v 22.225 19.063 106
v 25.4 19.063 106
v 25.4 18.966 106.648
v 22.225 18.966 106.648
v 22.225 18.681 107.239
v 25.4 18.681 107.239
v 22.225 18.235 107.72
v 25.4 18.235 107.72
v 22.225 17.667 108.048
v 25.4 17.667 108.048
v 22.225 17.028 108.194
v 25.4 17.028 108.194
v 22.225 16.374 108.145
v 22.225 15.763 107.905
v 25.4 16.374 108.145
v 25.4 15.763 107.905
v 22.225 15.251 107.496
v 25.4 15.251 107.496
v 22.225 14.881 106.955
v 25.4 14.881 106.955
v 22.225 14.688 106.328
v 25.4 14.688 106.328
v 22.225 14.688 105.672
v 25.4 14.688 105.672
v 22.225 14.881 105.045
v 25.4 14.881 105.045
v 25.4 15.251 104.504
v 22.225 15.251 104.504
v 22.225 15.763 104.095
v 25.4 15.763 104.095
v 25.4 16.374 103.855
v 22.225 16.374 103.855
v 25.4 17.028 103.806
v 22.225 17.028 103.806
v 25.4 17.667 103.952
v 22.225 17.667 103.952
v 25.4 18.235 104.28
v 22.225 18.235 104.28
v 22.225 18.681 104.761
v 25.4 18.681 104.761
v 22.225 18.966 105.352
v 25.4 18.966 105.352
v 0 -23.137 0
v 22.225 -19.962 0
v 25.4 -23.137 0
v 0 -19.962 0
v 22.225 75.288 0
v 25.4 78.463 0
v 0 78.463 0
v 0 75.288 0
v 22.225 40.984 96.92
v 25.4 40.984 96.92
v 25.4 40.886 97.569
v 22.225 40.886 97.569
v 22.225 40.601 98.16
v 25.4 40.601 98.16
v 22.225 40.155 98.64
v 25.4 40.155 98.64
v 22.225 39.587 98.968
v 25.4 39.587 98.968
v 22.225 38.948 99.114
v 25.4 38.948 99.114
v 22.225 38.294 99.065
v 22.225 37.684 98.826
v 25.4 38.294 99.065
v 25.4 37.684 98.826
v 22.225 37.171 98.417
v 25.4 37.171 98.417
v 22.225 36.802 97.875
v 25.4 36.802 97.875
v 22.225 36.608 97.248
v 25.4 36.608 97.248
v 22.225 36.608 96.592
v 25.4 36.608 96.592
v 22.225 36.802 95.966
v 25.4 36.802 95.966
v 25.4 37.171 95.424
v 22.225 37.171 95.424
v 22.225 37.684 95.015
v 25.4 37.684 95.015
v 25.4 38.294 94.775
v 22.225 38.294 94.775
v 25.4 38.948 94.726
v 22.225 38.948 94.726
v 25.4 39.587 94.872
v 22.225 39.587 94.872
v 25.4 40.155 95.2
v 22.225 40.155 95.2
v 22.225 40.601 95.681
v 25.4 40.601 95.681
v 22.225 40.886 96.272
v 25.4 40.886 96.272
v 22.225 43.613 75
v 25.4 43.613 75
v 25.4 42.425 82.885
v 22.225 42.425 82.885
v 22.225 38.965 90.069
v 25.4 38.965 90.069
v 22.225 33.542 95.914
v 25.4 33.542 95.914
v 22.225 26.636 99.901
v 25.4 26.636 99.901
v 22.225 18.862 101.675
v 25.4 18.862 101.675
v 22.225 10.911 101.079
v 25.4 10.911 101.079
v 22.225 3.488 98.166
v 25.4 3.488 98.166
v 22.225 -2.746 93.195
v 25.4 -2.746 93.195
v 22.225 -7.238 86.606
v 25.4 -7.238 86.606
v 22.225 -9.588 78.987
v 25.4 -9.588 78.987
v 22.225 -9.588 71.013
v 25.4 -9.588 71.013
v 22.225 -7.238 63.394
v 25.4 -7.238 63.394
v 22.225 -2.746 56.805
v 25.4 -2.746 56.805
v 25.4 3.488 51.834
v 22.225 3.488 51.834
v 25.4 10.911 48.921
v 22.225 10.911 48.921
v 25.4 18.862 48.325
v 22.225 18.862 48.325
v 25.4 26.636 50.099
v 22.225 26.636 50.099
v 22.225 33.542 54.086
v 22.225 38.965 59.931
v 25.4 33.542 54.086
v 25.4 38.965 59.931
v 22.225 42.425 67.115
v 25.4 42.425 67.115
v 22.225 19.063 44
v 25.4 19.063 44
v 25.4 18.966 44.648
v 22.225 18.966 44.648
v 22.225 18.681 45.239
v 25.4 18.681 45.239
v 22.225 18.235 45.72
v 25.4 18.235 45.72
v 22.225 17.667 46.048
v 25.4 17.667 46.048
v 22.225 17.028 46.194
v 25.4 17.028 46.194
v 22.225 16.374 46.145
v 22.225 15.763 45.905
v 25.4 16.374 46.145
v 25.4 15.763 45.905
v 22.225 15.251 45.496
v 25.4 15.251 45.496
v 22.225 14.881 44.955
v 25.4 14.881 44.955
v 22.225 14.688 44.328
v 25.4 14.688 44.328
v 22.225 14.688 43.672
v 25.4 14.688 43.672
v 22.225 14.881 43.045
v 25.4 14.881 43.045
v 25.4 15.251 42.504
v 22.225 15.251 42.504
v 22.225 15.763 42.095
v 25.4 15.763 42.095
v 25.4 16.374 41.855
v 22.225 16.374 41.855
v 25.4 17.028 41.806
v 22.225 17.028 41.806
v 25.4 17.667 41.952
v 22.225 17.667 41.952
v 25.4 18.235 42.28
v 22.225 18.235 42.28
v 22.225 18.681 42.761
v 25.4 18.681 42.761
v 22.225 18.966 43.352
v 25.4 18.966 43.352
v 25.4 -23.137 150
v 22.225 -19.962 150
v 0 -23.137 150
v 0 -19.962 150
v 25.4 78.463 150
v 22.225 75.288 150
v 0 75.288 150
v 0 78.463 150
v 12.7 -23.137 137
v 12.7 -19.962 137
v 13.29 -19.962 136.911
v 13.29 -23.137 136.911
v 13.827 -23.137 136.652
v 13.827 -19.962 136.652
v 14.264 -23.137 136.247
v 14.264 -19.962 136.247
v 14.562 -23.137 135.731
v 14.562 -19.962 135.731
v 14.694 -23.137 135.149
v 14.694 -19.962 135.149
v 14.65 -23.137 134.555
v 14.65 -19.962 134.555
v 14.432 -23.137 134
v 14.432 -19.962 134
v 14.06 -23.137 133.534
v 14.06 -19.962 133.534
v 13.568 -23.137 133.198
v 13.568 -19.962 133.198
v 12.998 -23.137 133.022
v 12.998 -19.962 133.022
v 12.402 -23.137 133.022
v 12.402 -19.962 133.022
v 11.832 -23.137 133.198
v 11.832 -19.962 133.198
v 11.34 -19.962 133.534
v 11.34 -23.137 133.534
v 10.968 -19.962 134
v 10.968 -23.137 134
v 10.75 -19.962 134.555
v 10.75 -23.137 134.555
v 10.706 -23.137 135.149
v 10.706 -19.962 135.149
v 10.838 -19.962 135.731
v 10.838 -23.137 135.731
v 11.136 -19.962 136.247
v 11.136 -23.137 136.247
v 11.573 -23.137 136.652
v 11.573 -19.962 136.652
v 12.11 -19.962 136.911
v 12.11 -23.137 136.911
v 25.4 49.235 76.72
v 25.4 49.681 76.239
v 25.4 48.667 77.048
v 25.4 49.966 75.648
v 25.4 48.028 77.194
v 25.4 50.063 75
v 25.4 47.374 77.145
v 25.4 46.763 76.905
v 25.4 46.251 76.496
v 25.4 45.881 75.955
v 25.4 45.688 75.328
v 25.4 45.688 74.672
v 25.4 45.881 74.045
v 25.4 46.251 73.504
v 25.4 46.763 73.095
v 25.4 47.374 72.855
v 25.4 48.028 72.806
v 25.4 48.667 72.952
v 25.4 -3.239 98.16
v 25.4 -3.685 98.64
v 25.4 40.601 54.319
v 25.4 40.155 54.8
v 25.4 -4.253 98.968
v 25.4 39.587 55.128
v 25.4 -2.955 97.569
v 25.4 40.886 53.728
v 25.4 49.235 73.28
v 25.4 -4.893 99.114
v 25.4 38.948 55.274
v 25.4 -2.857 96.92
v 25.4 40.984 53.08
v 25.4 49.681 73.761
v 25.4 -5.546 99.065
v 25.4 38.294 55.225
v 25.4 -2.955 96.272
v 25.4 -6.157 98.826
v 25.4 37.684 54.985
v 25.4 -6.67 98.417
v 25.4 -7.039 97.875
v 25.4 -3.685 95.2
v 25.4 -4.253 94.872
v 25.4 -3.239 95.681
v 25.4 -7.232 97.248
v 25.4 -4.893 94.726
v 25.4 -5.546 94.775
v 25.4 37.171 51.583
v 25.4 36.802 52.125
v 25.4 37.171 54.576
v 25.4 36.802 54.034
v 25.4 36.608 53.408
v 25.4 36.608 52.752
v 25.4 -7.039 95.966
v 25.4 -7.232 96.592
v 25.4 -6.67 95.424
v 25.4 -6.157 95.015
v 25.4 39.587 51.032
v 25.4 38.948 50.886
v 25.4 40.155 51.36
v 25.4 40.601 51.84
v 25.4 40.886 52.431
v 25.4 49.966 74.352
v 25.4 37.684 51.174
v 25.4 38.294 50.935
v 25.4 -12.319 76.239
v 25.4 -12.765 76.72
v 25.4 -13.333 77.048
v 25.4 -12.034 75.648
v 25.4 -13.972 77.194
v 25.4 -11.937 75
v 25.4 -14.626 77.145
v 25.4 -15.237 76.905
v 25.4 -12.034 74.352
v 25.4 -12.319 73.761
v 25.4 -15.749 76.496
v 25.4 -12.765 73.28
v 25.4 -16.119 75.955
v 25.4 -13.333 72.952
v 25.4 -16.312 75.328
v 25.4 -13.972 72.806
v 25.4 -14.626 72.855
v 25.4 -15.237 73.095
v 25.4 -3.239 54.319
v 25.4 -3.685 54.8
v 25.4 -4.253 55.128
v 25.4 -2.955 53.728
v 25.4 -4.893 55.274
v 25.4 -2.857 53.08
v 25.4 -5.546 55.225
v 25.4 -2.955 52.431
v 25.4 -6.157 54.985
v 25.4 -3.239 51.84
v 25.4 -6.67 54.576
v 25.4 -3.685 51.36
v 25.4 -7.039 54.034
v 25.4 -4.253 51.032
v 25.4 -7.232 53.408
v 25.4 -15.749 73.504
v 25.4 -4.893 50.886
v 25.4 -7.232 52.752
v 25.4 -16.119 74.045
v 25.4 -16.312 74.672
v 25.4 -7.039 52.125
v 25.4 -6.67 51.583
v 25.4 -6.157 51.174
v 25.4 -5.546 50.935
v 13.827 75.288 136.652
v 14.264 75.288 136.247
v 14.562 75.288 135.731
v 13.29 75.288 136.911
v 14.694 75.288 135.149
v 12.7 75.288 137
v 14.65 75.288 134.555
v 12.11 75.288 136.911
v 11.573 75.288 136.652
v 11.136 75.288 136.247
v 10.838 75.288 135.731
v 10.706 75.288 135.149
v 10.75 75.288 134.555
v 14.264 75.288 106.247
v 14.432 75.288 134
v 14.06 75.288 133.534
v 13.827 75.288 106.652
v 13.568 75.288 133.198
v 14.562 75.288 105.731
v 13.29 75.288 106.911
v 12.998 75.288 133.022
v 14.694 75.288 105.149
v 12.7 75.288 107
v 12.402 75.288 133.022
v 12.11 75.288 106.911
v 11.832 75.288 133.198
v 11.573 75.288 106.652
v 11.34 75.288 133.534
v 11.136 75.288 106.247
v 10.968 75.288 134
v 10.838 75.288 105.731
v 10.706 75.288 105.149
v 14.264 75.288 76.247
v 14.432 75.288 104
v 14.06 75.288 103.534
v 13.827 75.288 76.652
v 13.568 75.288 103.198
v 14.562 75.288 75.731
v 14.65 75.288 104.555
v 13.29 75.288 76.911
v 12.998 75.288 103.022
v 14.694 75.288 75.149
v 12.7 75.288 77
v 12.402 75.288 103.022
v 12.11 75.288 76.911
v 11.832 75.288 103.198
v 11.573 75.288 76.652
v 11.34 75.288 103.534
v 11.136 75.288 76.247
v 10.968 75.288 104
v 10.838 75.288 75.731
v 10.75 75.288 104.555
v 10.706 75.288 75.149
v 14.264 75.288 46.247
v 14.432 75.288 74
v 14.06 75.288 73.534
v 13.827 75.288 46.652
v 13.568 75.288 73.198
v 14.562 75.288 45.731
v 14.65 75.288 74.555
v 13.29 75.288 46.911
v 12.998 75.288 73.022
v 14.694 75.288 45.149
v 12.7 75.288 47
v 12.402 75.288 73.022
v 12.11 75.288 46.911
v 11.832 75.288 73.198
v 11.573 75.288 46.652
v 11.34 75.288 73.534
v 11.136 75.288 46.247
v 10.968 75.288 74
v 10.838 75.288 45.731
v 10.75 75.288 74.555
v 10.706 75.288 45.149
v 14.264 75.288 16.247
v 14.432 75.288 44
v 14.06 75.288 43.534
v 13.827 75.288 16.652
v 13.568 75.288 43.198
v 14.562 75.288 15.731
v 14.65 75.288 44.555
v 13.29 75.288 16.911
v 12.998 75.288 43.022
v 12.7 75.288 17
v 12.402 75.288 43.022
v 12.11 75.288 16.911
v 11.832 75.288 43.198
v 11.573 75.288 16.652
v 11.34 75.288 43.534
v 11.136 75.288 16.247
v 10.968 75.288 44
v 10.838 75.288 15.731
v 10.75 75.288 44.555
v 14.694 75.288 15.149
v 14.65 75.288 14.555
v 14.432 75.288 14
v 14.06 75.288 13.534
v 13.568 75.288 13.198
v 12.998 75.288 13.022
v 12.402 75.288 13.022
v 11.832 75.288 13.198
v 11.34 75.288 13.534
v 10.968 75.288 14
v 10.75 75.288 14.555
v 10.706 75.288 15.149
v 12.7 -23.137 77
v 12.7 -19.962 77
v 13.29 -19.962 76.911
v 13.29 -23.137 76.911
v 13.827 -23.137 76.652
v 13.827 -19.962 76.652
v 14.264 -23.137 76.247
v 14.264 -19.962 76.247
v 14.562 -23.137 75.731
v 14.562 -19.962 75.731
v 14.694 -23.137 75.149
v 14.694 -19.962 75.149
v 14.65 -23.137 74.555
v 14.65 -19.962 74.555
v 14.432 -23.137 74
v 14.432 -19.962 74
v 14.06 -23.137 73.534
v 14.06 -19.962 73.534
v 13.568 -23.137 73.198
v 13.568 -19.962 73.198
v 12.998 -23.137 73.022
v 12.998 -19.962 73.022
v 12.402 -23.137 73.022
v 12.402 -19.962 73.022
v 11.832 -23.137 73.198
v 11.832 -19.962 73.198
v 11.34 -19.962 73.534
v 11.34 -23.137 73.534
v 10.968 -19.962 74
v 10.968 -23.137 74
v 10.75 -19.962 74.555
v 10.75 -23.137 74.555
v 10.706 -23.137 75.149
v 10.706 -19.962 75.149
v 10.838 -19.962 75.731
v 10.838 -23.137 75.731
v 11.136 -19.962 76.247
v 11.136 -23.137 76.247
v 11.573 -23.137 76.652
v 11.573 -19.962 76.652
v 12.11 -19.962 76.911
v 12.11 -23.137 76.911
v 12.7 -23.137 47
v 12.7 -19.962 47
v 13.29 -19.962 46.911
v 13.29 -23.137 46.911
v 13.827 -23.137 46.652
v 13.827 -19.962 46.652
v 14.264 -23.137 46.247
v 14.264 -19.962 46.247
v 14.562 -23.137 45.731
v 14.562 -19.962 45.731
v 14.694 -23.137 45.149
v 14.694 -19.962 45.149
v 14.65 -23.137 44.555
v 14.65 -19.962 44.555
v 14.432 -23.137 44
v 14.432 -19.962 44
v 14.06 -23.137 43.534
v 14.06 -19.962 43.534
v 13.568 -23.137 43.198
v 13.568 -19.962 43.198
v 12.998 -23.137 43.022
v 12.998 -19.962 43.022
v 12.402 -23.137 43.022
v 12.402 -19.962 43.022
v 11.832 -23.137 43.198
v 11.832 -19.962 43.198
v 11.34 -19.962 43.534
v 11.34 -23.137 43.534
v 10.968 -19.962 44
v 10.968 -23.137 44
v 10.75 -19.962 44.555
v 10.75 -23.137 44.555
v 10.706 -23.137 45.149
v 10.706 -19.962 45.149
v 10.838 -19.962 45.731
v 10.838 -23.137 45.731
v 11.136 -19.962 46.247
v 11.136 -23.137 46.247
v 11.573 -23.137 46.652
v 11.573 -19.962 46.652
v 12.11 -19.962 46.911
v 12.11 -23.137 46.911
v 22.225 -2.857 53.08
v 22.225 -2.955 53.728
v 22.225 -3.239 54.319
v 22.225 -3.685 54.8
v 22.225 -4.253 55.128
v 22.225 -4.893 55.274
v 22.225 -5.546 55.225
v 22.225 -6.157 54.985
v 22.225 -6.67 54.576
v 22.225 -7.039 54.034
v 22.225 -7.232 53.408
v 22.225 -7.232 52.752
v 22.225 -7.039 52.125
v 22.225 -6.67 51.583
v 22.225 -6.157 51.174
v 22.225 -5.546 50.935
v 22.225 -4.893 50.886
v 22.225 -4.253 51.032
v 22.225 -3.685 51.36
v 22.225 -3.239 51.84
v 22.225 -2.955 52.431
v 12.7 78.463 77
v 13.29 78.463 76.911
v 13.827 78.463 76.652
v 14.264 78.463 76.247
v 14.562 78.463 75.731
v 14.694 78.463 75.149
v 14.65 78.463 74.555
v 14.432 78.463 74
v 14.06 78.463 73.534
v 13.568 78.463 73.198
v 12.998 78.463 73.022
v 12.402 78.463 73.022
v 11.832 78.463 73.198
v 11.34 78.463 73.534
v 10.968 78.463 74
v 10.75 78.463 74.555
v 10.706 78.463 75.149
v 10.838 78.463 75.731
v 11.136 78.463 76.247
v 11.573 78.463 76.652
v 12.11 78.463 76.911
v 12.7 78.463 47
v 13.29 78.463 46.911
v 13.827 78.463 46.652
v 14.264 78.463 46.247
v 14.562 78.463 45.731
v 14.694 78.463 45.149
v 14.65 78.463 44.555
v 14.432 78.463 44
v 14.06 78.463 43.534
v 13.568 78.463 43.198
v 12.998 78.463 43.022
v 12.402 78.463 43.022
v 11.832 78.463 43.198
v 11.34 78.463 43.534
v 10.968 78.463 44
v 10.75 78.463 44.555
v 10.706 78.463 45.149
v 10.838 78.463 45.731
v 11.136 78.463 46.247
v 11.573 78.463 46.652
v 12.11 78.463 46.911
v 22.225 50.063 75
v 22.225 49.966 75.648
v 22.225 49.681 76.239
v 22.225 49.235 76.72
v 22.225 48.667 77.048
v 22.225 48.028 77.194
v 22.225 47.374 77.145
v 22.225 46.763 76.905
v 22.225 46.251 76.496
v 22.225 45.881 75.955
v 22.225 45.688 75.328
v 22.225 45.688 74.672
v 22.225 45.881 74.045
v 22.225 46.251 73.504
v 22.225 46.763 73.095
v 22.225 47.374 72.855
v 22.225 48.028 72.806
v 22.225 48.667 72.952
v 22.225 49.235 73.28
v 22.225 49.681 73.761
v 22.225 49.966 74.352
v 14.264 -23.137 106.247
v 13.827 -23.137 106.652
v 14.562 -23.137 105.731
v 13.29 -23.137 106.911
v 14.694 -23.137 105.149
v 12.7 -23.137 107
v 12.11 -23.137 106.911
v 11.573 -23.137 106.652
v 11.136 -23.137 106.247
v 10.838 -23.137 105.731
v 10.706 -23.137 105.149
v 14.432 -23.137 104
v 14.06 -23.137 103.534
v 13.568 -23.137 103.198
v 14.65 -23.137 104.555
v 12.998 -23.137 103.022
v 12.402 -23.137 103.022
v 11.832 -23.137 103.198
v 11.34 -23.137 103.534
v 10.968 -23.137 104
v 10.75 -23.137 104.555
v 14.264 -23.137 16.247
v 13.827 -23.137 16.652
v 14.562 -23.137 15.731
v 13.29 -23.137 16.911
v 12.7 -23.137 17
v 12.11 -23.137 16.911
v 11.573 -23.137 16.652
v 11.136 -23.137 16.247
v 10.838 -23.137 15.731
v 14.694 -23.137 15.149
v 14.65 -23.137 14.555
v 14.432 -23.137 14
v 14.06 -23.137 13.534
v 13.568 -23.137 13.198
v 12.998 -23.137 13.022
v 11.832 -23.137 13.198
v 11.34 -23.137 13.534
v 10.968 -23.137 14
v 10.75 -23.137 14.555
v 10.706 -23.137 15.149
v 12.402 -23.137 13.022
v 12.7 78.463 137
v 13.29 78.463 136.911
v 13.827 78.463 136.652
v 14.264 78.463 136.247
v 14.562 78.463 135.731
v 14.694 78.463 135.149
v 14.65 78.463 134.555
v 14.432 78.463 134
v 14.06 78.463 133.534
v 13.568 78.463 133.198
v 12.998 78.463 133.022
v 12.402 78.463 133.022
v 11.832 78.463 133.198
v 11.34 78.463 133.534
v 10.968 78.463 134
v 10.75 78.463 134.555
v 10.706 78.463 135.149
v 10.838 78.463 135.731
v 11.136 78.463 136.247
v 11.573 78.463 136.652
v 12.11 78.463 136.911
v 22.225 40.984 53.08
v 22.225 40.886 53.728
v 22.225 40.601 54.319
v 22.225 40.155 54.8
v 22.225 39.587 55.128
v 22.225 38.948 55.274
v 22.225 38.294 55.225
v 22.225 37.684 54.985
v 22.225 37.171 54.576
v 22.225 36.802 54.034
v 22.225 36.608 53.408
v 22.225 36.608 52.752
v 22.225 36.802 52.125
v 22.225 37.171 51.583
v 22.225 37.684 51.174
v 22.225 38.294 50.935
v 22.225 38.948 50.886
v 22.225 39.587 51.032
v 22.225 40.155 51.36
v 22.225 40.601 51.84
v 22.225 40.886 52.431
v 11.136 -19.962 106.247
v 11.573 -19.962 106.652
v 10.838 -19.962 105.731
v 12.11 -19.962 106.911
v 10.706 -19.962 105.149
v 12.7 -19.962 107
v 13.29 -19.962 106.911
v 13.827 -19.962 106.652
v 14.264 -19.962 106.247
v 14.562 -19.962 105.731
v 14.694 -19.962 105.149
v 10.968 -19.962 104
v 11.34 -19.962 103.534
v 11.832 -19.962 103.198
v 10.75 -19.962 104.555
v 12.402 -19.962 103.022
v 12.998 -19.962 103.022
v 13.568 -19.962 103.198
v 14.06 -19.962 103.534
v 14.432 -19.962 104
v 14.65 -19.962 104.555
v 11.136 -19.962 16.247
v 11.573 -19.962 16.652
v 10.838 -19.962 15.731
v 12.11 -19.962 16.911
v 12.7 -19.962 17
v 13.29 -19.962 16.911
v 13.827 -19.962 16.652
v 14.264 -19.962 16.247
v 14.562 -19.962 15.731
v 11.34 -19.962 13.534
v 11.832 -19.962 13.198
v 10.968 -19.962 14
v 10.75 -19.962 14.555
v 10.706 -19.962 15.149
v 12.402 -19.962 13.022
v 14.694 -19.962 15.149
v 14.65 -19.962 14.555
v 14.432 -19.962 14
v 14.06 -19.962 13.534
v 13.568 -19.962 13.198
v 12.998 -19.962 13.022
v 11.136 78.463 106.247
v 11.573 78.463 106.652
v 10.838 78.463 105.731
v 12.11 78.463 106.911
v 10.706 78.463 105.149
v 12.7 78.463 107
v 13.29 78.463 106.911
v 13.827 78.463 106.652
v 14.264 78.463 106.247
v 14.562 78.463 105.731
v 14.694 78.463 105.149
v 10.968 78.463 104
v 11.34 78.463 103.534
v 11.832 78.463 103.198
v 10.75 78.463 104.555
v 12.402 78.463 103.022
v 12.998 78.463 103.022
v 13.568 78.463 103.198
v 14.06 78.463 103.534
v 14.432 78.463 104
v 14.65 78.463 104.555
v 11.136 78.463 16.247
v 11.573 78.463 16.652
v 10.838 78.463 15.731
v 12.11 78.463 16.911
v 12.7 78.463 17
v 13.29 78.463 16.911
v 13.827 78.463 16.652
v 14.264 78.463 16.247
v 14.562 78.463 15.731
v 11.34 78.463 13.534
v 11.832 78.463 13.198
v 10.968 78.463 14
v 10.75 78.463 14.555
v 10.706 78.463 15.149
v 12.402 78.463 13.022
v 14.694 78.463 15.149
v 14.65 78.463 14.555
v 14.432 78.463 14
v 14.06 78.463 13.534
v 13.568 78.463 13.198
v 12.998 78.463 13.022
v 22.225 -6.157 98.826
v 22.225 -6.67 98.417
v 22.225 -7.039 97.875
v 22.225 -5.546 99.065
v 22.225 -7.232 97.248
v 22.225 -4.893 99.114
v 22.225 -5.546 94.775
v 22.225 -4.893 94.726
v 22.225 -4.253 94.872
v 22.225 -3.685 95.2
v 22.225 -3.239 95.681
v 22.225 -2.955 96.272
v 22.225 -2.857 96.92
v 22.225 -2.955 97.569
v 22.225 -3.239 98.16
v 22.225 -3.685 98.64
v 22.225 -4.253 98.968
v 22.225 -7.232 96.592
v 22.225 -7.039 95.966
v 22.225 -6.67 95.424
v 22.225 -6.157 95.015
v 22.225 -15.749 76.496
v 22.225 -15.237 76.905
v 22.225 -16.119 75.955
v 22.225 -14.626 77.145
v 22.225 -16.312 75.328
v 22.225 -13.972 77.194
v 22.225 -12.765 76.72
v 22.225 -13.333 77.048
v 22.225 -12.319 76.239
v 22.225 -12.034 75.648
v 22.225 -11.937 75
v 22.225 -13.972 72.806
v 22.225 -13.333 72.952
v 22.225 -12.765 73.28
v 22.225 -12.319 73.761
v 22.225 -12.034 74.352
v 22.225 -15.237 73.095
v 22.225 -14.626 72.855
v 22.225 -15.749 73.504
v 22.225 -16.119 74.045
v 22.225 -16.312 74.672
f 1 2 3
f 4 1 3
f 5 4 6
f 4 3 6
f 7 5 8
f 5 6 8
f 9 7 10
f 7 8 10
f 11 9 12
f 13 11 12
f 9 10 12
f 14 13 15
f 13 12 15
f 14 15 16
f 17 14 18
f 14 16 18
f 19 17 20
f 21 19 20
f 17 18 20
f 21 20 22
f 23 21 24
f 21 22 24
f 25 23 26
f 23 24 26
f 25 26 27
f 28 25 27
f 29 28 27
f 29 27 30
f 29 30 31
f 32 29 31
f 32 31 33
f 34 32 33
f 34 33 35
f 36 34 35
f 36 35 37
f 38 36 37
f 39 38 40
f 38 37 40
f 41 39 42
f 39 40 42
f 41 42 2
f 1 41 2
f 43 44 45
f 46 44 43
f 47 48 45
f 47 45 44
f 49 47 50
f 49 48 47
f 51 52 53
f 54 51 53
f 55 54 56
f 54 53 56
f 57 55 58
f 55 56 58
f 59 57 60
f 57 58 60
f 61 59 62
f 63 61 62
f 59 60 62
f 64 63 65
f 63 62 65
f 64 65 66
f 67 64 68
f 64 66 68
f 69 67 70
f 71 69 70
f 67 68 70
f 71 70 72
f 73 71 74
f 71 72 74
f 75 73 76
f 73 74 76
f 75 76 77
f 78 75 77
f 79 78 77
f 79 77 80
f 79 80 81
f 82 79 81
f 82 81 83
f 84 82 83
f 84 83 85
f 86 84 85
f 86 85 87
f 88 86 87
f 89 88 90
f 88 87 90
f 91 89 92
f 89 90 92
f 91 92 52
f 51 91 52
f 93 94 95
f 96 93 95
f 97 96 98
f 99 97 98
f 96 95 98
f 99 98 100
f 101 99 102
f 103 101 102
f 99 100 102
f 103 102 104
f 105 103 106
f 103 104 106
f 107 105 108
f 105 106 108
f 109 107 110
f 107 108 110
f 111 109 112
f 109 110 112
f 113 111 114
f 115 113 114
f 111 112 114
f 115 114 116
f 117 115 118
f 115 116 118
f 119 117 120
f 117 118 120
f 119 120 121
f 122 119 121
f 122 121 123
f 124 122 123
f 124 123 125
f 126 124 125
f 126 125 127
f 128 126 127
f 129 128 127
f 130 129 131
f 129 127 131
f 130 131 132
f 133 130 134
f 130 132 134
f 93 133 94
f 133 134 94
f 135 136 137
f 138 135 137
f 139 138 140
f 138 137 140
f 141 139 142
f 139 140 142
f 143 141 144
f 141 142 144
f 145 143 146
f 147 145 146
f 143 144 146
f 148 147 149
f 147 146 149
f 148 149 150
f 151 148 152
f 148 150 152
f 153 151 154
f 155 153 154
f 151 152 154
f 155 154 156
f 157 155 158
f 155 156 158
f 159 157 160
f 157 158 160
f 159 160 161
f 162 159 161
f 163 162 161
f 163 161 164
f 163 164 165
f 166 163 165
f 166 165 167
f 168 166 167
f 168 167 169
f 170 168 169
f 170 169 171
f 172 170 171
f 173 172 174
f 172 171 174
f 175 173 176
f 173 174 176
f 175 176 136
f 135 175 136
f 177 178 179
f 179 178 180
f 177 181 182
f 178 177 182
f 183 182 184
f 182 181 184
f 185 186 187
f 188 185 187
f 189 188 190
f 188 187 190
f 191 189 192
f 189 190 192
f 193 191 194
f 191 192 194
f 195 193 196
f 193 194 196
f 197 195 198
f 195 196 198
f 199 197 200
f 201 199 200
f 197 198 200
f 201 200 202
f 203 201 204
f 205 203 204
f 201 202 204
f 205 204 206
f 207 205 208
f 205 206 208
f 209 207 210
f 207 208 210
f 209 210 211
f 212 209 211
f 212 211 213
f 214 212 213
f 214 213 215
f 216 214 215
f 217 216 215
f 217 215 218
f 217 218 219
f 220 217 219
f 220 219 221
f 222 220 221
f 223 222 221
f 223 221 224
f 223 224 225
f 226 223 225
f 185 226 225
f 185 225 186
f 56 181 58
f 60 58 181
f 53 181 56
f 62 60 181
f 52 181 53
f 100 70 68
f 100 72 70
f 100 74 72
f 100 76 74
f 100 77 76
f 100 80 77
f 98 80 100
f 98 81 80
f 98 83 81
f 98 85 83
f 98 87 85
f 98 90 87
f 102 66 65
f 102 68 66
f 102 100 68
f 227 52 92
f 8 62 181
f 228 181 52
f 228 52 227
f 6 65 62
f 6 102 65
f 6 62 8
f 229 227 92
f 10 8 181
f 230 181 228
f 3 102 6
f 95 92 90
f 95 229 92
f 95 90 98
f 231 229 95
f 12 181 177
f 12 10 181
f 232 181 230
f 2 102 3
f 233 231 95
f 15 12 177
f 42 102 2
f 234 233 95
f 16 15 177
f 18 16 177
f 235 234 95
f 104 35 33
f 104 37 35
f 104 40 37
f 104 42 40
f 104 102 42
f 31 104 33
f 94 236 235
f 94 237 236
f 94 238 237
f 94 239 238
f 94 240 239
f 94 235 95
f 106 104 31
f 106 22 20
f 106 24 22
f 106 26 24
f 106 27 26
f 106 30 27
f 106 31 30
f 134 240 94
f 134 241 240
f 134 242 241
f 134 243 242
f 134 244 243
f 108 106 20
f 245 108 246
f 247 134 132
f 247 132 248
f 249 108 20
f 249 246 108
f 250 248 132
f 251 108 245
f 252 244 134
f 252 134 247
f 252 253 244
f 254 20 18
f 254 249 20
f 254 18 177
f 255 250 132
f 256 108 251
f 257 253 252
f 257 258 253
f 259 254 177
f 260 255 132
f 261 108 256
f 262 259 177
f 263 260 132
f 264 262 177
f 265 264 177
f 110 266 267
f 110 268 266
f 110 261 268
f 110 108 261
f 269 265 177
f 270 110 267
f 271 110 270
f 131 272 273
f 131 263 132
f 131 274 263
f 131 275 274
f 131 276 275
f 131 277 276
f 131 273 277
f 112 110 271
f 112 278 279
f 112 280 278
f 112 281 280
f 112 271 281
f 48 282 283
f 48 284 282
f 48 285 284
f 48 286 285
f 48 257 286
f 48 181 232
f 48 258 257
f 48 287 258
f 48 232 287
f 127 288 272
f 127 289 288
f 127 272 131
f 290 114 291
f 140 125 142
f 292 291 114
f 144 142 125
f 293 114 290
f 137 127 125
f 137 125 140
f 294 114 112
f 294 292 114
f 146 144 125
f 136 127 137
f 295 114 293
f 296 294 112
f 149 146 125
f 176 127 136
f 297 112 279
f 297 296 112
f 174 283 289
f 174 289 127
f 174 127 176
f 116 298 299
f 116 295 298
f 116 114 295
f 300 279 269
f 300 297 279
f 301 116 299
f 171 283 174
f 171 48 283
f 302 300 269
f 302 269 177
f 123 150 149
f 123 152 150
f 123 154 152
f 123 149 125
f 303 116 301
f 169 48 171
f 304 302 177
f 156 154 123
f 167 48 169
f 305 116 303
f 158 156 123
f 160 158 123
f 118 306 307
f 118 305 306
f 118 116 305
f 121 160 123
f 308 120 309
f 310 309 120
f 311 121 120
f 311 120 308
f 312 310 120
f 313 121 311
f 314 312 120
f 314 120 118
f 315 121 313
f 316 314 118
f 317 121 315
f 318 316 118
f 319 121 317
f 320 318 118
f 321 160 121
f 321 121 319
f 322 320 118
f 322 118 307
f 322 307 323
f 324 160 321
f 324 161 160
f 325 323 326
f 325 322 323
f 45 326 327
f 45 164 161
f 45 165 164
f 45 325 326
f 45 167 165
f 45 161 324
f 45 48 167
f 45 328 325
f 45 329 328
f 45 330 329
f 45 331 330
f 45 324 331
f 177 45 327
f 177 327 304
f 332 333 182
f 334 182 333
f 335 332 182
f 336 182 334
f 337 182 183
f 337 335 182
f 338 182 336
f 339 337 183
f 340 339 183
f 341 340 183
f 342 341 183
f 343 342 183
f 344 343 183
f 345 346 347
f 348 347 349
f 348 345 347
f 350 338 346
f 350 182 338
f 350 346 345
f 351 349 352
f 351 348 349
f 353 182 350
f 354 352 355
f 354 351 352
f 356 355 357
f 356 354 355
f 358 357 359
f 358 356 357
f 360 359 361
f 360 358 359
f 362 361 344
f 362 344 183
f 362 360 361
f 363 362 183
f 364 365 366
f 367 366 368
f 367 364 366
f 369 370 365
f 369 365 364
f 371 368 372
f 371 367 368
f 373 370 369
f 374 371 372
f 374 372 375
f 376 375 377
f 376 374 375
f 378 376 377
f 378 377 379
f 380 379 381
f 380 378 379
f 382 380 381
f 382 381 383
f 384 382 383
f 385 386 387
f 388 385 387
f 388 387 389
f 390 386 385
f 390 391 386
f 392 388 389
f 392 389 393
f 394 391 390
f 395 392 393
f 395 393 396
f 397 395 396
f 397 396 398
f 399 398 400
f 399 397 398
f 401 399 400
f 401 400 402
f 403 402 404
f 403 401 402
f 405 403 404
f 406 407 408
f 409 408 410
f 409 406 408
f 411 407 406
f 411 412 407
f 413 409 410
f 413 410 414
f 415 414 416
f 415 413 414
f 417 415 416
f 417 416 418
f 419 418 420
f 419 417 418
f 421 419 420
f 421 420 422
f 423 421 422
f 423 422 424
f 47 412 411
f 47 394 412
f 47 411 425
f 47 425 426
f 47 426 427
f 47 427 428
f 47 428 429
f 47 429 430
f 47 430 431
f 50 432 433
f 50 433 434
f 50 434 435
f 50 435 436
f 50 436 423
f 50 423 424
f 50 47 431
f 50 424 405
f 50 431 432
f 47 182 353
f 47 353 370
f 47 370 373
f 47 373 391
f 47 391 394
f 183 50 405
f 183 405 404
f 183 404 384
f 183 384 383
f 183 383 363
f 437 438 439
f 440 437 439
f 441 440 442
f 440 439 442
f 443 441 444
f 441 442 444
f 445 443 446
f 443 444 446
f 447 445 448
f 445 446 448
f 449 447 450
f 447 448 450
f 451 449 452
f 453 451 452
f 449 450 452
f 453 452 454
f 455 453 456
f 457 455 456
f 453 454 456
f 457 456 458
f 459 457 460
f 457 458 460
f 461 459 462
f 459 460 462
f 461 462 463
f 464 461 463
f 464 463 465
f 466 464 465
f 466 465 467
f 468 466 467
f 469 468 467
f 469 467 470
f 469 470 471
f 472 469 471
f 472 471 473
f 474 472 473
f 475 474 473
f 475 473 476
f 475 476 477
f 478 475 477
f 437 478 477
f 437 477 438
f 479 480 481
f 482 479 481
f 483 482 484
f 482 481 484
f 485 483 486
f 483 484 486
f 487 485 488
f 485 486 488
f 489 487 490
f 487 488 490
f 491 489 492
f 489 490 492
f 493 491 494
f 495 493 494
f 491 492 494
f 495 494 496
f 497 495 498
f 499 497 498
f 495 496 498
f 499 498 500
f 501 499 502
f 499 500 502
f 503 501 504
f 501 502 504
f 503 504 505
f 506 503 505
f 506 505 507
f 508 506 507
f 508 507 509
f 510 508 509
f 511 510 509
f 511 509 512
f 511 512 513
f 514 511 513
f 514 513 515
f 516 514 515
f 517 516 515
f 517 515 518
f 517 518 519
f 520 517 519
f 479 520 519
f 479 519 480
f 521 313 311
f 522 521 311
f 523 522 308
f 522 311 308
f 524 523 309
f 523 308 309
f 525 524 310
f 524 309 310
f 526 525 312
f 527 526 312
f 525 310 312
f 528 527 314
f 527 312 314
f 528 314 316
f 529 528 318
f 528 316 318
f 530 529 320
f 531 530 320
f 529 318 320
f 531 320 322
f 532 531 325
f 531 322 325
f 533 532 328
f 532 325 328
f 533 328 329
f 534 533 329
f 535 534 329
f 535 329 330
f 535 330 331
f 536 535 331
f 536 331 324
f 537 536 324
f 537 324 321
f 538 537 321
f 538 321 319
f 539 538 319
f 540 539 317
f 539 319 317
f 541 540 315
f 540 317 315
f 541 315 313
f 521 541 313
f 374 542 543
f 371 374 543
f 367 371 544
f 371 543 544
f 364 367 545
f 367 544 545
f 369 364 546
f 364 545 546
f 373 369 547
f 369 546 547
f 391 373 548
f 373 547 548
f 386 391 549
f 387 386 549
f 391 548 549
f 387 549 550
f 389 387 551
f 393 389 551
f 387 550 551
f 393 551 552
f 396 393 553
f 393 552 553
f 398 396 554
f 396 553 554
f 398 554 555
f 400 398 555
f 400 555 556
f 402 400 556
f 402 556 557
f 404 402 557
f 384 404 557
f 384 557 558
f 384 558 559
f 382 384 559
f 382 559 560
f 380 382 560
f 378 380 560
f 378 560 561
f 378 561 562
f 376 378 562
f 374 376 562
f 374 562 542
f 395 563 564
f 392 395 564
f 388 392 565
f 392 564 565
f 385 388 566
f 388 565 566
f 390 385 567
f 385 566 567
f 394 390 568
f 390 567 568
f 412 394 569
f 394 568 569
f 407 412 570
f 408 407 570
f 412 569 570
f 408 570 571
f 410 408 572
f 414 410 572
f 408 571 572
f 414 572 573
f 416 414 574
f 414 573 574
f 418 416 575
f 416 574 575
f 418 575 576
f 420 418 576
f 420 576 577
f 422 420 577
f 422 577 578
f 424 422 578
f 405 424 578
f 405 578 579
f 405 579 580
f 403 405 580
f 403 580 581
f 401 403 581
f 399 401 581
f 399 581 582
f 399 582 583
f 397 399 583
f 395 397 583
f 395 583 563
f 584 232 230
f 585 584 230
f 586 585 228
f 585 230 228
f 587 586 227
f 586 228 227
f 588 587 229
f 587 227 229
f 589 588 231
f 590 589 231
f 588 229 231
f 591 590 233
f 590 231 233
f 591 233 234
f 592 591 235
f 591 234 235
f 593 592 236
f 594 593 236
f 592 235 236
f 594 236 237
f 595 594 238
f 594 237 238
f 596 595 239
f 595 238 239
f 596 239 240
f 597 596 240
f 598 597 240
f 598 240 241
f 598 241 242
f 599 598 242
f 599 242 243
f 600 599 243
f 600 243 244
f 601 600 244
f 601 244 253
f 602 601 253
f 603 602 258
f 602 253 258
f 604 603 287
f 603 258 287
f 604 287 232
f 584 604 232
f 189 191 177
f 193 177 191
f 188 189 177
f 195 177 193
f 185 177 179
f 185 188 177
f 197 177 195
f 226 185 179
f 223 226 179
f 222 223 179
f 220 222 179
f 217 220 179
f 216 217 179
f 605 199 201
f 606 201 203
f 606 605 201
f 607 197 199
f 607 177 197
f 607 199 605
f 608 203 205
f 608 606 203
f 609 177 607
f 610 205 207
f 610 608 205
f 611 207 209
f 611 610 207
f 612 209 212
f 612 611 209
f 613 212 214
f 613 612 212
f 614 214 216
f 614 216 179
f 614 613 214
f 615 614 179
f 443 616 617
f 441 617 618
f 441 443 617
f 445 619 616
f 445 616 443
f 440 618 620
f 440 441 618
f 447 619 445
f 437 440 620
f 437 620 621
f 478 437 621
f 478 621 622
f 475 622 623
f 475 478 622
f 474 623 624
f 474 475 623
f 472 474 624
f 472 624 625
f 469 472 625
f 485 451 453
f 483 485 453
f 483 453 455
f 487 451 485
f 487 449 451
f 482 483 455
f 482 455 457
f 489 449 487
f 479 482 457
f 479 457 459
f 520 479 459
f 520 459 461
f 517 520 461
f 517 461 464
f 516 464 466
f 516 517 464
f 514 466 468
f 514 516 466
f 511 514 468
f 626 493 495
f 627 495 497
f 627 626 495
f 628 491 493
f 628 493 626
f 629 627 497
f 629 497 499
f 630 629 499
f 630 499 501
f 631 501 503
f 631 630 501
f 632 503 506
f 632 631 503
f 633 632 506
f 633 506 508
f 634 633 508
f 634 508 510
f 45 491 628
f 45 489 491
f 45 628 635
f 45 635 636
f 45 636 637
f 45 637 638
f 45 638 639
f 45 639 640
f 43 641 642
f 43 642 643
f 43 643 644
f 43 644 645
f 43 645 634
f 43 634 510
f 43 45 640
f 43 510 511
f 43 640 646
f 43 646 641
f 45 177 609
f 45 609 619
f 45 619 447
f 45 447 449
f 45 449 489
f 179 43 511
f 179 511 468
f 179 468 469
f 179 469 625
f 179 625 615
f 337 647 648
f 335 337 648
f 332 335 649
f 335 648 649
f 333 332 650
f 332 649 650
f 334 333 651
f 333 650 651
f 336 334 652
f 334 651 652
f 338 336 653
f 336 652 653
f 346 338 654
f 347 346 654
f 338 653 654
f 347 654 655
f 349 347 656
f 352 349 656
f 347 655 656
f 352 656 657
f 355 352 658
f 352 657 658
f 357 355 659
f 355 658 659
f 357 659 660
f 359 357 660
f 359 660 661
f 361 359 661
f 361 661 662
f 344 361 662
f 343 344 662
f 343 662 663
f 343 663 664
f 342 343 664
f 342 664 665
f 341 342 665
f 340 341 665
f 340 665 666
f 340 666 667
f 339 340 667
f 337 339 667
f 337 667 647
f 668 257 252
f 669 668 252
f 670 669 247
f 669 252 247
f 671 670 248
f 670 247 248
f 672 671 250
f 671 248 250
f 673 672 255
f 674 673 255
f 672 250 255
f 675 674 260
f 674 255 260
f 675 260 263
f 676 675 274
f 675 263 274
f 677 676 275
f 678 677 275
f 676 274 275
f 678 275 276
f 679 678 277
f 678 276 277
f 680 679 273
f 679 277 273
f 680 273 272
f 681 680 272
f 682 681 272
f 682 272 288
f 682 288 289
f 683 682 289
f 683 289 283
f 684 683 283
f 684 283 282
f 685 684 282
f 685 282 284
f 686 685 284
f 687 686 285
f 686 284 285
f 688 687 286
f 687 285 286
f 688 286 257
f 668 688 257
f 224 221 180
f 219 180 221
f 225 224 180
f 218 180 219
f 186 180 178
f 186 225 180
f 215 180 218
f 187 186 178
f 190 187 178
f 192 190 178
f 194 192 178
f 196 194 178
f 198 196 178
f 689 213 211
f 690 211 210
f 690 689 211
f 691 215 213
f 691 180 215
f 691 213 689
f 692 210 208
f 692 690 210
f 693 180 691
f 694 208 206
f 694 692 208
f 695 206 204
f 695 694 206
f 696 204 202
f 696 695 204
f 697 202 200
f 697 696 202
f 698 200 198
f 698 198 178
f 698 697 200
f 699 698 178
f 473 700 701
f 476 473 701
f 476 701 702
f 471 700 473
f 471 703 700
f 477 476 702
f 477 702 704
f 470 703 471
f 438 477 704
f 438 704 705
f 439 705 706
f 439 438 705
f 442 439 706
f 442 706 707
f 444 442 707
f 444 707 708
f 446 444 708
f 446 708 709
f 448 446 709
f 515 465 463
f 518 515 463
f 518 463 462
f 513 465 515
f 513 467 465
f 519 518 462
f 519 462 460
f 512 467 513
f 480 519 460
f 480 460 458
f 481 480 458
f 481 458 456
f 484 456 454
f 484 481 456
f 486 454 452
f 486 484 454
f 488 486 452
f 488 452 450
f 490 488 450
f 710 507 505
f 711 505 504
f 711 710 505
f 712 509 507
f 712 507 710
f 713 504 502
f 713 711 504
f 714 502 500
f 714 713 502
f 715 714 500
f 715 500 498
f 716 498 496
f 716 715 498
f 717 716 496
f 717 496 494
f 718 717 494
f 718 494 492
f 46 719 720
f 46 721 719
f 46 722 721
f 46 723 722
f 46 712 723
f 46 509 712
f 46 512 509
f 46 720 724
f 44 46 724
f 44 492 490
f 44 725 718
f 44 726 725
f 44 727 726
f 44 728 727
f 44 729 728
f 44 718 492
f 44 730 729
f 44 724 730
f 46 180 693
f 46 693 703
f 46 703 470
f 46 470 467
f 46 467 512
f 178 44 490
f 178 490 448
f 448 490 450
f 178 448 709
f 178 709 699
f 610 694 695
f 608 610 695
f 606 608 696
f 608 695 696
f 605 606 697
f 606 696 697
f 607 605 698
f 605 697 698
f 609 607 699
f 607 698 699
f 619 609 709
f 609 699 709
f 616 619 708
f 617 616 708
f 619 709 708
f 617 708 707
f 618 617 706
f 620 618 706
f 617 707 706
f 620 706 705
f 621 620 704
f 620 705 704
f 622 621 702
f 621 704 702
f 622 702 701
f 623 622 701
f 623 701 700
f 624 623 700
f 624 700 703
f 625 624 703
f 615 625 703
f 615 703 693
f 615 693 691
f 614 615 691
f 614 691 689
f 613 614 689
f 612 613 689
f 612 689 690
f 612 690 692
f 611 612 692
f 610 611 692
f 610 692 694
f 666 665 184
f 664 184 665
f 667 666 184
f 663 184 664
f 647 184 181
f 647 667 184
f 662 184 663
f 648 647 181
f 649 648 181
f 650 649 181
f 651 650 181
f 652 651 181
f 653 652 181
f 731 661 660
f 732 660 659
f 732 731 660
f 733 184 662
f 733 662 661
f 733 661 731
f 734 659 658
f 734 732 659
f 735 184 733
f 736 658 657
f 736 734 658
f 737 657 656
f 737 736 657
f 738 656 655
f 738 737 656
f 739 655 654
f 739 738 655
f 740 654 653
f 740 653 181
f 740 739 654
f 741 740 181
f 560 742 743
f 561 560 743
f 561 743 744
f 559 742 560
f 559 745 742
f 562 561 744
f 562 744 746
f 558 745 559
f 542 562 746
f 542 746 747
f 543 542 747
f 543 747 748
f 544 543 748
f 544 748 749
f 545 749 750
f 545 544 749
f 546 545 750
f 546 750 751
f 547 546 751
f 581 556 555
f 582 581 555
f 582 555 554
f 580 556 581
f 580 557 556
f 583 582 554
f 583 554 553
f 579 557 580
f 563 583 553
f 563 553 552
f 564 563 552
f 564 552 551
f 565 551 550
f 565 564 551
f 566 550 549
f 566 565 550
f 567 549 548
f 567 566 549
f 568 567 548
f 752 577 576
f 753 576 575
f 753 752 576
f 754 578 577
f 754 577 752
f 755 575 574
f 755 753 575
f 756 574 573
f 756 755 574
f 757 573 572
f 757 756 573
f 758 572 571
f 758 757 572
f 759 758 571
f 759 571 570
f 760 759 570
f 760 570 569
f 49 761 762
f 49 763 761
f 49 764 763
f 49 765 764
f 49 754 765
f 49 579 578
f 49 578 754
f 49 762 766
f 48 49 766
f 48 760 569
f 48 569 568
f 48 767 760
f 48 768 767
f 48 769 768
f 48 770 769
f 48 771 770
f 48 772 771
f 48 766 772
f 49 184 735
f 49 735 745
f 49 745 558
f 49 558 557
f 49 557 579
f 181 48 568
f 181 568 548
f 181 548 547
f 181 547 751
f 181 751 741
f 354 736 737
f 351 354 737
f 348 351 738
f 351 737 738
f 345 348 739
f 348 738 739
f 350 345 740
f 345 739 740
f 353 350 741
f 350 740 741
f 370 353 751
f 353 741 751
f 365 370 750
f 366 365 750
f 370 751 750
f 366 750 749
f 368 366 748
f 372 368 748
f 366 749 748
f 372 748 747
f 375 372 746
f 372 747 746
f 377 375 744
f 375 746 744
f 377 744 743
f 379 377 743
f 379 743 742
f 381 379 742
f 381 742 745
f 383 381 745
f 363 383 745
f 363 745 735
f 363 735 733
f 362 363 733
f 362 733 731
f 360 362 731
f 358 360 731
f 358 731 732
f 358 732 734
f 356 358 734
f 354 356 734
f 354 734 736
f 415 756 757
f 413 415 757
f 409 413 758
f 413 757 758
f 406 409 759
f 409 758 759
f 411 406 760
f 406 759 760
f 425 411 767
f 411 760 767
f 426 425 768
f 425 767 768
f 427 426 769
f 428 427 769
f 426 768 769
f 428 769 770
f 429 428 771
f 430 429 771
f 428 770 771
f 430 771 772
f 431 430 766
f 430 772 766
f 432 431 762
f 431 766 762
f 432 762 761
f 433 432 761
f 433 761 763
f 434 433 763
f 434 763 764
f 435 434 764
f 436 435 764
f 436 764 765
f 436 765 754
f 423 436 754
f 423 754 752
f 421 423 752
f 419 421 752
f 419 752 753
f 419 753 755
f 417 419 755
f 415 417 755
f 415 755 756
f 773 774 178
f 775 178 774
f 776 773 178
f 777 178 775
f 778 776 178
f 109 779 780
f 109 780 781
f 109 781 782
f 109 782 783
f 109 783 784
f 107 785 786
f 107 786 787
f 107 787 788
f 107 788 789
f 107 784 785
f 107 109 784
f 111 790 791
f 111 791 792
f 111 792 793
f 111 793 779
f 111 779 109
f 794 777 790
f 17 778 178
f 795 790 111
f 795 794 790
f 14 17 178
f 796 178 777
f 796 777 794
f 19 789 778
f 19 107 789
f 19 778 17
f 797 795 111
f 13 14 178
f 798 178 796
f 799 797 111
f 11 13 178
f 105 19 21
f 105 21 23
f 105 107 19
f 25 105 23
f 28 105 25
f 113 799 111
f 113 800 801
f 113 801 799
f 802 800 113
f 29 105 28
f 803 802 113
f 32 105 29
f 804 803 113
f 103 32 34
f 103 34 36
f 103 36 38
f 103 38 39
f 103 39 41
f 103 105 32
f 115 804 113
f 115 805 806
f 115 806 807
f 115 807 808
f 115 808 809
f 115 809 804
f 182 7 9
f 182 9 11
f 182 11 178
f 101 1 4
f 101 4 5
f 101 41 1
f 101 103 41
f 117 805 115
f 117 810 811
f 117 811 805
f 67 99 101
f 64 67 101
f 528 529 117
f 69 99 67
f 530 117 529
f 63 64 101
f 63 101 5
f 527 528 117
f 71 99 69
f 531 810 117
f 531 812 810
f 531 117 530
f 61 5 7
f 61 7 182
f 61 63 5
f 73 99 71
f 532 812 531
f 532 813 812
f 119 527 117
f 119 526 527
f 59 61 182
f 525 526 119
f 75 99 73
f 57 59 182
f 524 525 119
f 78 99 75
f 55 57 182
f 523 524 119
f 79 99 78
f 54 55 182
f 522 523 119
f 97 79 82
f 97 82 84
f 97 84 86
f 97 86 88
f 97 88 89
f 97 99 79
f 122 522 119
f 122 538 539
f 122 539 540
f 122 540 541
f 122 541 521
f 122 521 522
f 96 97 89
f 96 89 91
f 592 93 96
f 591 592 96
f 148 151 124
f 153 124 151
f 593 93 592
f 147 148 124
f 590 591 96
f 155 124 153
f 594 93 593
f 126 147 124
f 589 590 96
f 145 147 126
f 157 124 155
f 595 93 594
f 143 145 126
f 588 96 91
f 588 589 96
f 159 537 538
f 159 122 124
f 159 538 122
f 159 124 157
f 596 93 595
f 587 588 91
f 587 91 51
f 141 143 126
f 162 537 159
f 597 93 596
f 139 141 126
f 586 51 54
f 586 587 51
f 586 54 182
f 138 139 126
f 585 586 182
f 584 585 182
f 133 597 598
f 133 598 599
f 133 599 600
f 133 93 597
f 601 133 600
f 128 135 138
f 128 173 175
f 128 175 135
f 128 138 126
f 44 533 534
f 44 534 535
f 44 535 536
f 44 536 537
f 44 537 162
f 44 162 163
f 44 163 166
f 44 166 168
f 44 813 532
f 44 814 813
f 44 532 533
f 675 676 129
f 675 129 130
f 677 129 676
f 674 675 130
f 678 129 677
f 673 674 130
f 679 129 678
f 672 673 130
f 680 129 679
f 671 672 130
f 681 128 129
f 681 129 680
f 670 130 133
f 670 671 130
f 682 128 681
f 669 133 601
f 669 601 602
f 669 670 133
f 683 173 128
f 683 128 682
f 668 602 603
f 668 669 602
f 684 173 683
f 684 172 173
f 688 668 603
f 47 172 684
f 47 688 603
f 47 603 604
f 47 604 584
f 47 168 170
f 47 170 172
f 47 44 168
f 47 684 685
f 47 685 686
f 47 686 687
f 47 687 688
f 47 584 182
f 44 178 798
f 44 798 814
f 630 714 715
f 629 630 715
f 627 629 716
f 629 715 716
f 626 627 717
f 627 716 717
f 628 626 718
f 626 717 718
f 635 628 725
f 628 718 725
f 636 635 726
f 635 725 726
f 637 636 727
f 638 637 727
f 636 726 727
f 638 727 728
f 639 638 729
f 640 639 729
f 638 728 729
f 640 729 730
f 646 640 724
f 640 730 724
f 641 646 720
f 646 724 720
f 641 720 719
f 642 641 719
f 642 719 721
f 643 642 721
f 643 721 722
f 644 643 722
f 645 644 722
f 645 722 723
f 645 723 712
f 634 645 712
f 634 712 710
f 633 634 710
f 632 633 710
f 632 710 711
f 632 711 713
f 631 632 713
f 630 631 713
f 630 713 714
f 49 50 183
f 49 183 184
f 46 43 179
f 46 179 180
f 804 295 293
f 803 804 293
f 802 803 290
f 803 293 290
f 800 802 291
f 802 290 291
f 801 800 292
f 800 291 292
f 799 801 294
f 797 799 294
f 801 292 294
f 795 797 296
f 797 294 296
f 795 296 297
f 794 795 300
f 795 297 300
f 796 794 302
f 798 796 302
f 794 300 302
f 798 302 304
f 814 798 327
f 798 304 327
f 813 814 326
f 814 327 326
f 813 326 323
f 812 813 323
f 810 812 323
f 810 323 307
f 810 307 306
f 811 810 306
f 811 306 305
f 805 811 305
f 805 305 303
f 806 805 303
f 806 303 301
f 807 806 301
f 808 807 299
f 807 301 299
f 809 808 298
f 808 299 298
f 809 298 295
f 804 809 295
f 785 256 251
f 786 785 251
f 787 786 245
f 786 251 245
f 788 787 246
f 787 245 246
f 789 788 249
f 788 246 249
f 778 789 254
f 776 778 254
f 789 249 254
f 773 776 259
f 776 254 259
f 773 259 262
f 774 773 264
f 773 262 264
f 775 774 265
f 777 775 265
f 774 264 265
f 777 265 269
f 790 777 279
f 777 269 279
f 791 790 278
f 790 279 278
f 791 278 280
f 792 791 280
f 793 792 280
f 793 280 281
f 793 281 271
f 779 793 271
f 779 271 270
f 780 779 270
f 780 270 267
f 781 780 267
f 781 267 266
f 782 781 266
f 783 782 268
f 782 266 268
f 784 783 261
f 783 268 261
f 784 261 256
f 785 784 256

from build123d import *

# Parameters (mm, degrees)
BOSS_EXTRUDE1_DEPTH = 150
SKETCH2_R           = 26.75
SKETCH2_R_2         = 2.2
CUT_EXTRUDE1_DEPTH  = 3.175
CUT_EXTRUDE2_REACH  = 184.942
SKETCH3_R           = 2


with BuildPart() as part:
    # Sketch1 → Boss-Extrude1 (new body)
    with BuildSketch(Plane.XY):
        Polygon((0, 78.463366337), (25.4, 78.463366337), (25.4, -23.136633663), (0, -23.136633663), (0, -19.961633663), (22.225, -19.961633663), (22.225, 75.288366337), (0, 75.288366337), align=None)
    extrude(amount=BOSS_EXTRUDE1_DEPTH)

    # Sketch2 → Cut-Extrude1 (cut)
    with BuildSketch(Plane(origin=(25.4, 0, 0), x_dir=(0, 0, -1), z_dir=(1, 0, 0))):
        with Locations(Location((-75, 16.863366337, 0), (0, 0, 90))):
            Circle(SKETCH2_R)
        with Locations(Location((-75, 47.863366337, 0), (0, 0, 90))):
            Circle(SKETCH2_R_2)
        with Locations(Location((-53.079689783, 38.783676553, 0), (0, 0, 90))):
            Circle(SKETCH2_R_2)
        with Locations(Location((-44, 16.863366337, 0), (0, 0, 90))):
            Circle(SKETCH2_R_2)
        with Locations(Location((-53.079689783, -5.05694388, 0), (0, 0, 90))):
            Circle(SKETCH2_R_2)
        with Locations(Location((-75, -14.136633663, 0), (0, 0, 90))):
            Circle(SKETCH2_R_2)
        with Locations(Location((-96.920310217, -5.05694388, 0), (0, 0, 90))):
            Circle(SKETCH2_R_2)
        with Locations(Location((-106, 16.863366337, 0), (0, 0, 90))):
            Circle(SKETCH2_R_2)
        with Locations(Location((-96.920310217, 38.783676553, 0), (0, 0, 90))):
            Circle(SKETCH2_R_2)
    extrude(amount=-CUT_EXTRUDE1_DEPTH, mode=Mode.SUBTRACT)

    # Cut-Extrude2: up to this face of the body (flat: up to its plane)
    cut_extrude2_end = Plane(part.part.faces().sort_by_distance((12.7, -23.136633663, 75))[0])
    # Sketch3 → Cut-Extrude2 (cut, up to the picked face)
    with BuildSketch(Plane(origin=(0, 78.463366337, 0), x_dir=(1, 0, 0), z_dir=(0, 1, 0)), mode=Mode.PRIVATE) as cut_extrude2_sk1:
        with Locations(Location((12.7, -75, 0), (0, 0, 270))):
            Circle(SKETCH3_R)
    cut_extrude2_tool1 = split(extrude(cut_extrude2_sk1.sketch, amount=-CUT_EXTRUDE2_REACH, mode=Mode.PRIVATE), bisect_by=cut_extrude2_end, keep=Keep.BOTH, mode=Mode.PRIVATE)
    # Sketch3 → Cut-Extrude2 (cut, up to the picked face)
    with BuildSketch(Plane(origin=(0, 78.463366337, 0), x_dir=(1, 0, 0), z_dir=(0, 1, 0)), mode=Mode.PRIVATE) as cut_extrude2_sk2:
        with Locations(Location((12.7, -105, 0), (0, 0, 270))):
            Circle(SKETCH3_R)
    cut_extrude2_tool2 = split(extrude(cut_extrude2_sk2.sketch, amount=-CUT_EXTRUDE2_REACH, mode=Mode.PRIVATE), bisect_by=cut_extrude2_end, keep=Keep.BOTH, mode=Mode.PRIVATE)
    # Sketch3 → Cut-Extrude2 (cut, up to the picked face)
    with BuildSketch(Plane(origin=(0, 78.463366337, 0), x_dir=(1, 0, 0), z_dir=(0, 1, 0)), mode=Mode.PRIVATE) as cut_extrude2_sk3:
        with Locations(Location((12.7, -135, 0), (0, 0, 270))):
            Circle(SKETCH3_R)
    cut_extrude2_tool3 = split(extrude(cut_extrude2_sk3.sketch, amount=-CUT_EXTRUDE2_REACH, mode=Mode.PRIVATE), bisect_by=cut_extrude2_end, keep=Keep.BOTH, mode=Mode.PRIVATE)
    # Sketch3 → Cut-Extrude2 (cut, up to the picked face)
    with BuildSketch(Plane(origin=(0, 78.463366337, 0), x_dir=(1, 0, 0), z_dir=(0, 1, 0)), mode=Mode.PRIVATE) as cut_extrude2_sk4:
        with Locations(Location((12.7, -45, 0), (0, 0, 270))):
            Circle(SKETCH3_R)
    cut_extrude2_tool4 = split(extrude(cut_extrude2_sk4.sketch, amount=-CUT_EXTRUDE2_REACH, mode=Mode.PRIVATE), bisect_by=cut_extrude2_end, keep=Keep.BOTH, mode=Mode.PRIVATE)
    # Sketch3 → Cut-Extrude2 (cut, up to the picked face)
    with BuildSketch(Plane(origin=(0, 78.463366337, 0), x_dir=(1, 0, 0), z_dir=(0, 1, 0)), mode=Mode.PRIVATE) as cut_extrude2_sk5:
        with Locations(Location((12.7, -15, 0), (0, 0, 270))):
            Circle(SKETCH3_R)
    cut_extrude2_tool5 = split(extrude(cut_extrude2_sk5.sketch, amount=-CUT_EXTRUDE2_REACH, mode=Mode.PRIVATE), bisect_by=cut_extrude2_end, keep=Keep.BOTH, mode=Mode.PRIVATE)
    add(cut_extrude2_tool1.solids().sort_by(Axis((12.7, 78.463366, 75), (0, -1, 0)))[0], mode=Mode.SUBTRACT)
    add(cut_extrude2_tool2.solids().sort_by(Axis((12.7, 78.463366, 105), (0, -1, 0)))[0], mode=Mode.SUBTRACT)
    add(cut_extrude2_tool3.solids().sort_by(Axis((12.7, 78.463366, 135), (0, -1, 0)))[0], mode=Mode.SUBTRACT)
    add(cut_extrude2_tool4.solids().sort_by(Axis((12.7, 78.463366, 45), (0, -1, 0)))[0], mode=Mode.SUBTRACT)
    add(cut_extrude2_tool5.solids().sort_by(Axis((12.7, 78.463366, 15), (0, -1, 0)))[0], mode=Mode.SUBTRACT)


solid = part.part
